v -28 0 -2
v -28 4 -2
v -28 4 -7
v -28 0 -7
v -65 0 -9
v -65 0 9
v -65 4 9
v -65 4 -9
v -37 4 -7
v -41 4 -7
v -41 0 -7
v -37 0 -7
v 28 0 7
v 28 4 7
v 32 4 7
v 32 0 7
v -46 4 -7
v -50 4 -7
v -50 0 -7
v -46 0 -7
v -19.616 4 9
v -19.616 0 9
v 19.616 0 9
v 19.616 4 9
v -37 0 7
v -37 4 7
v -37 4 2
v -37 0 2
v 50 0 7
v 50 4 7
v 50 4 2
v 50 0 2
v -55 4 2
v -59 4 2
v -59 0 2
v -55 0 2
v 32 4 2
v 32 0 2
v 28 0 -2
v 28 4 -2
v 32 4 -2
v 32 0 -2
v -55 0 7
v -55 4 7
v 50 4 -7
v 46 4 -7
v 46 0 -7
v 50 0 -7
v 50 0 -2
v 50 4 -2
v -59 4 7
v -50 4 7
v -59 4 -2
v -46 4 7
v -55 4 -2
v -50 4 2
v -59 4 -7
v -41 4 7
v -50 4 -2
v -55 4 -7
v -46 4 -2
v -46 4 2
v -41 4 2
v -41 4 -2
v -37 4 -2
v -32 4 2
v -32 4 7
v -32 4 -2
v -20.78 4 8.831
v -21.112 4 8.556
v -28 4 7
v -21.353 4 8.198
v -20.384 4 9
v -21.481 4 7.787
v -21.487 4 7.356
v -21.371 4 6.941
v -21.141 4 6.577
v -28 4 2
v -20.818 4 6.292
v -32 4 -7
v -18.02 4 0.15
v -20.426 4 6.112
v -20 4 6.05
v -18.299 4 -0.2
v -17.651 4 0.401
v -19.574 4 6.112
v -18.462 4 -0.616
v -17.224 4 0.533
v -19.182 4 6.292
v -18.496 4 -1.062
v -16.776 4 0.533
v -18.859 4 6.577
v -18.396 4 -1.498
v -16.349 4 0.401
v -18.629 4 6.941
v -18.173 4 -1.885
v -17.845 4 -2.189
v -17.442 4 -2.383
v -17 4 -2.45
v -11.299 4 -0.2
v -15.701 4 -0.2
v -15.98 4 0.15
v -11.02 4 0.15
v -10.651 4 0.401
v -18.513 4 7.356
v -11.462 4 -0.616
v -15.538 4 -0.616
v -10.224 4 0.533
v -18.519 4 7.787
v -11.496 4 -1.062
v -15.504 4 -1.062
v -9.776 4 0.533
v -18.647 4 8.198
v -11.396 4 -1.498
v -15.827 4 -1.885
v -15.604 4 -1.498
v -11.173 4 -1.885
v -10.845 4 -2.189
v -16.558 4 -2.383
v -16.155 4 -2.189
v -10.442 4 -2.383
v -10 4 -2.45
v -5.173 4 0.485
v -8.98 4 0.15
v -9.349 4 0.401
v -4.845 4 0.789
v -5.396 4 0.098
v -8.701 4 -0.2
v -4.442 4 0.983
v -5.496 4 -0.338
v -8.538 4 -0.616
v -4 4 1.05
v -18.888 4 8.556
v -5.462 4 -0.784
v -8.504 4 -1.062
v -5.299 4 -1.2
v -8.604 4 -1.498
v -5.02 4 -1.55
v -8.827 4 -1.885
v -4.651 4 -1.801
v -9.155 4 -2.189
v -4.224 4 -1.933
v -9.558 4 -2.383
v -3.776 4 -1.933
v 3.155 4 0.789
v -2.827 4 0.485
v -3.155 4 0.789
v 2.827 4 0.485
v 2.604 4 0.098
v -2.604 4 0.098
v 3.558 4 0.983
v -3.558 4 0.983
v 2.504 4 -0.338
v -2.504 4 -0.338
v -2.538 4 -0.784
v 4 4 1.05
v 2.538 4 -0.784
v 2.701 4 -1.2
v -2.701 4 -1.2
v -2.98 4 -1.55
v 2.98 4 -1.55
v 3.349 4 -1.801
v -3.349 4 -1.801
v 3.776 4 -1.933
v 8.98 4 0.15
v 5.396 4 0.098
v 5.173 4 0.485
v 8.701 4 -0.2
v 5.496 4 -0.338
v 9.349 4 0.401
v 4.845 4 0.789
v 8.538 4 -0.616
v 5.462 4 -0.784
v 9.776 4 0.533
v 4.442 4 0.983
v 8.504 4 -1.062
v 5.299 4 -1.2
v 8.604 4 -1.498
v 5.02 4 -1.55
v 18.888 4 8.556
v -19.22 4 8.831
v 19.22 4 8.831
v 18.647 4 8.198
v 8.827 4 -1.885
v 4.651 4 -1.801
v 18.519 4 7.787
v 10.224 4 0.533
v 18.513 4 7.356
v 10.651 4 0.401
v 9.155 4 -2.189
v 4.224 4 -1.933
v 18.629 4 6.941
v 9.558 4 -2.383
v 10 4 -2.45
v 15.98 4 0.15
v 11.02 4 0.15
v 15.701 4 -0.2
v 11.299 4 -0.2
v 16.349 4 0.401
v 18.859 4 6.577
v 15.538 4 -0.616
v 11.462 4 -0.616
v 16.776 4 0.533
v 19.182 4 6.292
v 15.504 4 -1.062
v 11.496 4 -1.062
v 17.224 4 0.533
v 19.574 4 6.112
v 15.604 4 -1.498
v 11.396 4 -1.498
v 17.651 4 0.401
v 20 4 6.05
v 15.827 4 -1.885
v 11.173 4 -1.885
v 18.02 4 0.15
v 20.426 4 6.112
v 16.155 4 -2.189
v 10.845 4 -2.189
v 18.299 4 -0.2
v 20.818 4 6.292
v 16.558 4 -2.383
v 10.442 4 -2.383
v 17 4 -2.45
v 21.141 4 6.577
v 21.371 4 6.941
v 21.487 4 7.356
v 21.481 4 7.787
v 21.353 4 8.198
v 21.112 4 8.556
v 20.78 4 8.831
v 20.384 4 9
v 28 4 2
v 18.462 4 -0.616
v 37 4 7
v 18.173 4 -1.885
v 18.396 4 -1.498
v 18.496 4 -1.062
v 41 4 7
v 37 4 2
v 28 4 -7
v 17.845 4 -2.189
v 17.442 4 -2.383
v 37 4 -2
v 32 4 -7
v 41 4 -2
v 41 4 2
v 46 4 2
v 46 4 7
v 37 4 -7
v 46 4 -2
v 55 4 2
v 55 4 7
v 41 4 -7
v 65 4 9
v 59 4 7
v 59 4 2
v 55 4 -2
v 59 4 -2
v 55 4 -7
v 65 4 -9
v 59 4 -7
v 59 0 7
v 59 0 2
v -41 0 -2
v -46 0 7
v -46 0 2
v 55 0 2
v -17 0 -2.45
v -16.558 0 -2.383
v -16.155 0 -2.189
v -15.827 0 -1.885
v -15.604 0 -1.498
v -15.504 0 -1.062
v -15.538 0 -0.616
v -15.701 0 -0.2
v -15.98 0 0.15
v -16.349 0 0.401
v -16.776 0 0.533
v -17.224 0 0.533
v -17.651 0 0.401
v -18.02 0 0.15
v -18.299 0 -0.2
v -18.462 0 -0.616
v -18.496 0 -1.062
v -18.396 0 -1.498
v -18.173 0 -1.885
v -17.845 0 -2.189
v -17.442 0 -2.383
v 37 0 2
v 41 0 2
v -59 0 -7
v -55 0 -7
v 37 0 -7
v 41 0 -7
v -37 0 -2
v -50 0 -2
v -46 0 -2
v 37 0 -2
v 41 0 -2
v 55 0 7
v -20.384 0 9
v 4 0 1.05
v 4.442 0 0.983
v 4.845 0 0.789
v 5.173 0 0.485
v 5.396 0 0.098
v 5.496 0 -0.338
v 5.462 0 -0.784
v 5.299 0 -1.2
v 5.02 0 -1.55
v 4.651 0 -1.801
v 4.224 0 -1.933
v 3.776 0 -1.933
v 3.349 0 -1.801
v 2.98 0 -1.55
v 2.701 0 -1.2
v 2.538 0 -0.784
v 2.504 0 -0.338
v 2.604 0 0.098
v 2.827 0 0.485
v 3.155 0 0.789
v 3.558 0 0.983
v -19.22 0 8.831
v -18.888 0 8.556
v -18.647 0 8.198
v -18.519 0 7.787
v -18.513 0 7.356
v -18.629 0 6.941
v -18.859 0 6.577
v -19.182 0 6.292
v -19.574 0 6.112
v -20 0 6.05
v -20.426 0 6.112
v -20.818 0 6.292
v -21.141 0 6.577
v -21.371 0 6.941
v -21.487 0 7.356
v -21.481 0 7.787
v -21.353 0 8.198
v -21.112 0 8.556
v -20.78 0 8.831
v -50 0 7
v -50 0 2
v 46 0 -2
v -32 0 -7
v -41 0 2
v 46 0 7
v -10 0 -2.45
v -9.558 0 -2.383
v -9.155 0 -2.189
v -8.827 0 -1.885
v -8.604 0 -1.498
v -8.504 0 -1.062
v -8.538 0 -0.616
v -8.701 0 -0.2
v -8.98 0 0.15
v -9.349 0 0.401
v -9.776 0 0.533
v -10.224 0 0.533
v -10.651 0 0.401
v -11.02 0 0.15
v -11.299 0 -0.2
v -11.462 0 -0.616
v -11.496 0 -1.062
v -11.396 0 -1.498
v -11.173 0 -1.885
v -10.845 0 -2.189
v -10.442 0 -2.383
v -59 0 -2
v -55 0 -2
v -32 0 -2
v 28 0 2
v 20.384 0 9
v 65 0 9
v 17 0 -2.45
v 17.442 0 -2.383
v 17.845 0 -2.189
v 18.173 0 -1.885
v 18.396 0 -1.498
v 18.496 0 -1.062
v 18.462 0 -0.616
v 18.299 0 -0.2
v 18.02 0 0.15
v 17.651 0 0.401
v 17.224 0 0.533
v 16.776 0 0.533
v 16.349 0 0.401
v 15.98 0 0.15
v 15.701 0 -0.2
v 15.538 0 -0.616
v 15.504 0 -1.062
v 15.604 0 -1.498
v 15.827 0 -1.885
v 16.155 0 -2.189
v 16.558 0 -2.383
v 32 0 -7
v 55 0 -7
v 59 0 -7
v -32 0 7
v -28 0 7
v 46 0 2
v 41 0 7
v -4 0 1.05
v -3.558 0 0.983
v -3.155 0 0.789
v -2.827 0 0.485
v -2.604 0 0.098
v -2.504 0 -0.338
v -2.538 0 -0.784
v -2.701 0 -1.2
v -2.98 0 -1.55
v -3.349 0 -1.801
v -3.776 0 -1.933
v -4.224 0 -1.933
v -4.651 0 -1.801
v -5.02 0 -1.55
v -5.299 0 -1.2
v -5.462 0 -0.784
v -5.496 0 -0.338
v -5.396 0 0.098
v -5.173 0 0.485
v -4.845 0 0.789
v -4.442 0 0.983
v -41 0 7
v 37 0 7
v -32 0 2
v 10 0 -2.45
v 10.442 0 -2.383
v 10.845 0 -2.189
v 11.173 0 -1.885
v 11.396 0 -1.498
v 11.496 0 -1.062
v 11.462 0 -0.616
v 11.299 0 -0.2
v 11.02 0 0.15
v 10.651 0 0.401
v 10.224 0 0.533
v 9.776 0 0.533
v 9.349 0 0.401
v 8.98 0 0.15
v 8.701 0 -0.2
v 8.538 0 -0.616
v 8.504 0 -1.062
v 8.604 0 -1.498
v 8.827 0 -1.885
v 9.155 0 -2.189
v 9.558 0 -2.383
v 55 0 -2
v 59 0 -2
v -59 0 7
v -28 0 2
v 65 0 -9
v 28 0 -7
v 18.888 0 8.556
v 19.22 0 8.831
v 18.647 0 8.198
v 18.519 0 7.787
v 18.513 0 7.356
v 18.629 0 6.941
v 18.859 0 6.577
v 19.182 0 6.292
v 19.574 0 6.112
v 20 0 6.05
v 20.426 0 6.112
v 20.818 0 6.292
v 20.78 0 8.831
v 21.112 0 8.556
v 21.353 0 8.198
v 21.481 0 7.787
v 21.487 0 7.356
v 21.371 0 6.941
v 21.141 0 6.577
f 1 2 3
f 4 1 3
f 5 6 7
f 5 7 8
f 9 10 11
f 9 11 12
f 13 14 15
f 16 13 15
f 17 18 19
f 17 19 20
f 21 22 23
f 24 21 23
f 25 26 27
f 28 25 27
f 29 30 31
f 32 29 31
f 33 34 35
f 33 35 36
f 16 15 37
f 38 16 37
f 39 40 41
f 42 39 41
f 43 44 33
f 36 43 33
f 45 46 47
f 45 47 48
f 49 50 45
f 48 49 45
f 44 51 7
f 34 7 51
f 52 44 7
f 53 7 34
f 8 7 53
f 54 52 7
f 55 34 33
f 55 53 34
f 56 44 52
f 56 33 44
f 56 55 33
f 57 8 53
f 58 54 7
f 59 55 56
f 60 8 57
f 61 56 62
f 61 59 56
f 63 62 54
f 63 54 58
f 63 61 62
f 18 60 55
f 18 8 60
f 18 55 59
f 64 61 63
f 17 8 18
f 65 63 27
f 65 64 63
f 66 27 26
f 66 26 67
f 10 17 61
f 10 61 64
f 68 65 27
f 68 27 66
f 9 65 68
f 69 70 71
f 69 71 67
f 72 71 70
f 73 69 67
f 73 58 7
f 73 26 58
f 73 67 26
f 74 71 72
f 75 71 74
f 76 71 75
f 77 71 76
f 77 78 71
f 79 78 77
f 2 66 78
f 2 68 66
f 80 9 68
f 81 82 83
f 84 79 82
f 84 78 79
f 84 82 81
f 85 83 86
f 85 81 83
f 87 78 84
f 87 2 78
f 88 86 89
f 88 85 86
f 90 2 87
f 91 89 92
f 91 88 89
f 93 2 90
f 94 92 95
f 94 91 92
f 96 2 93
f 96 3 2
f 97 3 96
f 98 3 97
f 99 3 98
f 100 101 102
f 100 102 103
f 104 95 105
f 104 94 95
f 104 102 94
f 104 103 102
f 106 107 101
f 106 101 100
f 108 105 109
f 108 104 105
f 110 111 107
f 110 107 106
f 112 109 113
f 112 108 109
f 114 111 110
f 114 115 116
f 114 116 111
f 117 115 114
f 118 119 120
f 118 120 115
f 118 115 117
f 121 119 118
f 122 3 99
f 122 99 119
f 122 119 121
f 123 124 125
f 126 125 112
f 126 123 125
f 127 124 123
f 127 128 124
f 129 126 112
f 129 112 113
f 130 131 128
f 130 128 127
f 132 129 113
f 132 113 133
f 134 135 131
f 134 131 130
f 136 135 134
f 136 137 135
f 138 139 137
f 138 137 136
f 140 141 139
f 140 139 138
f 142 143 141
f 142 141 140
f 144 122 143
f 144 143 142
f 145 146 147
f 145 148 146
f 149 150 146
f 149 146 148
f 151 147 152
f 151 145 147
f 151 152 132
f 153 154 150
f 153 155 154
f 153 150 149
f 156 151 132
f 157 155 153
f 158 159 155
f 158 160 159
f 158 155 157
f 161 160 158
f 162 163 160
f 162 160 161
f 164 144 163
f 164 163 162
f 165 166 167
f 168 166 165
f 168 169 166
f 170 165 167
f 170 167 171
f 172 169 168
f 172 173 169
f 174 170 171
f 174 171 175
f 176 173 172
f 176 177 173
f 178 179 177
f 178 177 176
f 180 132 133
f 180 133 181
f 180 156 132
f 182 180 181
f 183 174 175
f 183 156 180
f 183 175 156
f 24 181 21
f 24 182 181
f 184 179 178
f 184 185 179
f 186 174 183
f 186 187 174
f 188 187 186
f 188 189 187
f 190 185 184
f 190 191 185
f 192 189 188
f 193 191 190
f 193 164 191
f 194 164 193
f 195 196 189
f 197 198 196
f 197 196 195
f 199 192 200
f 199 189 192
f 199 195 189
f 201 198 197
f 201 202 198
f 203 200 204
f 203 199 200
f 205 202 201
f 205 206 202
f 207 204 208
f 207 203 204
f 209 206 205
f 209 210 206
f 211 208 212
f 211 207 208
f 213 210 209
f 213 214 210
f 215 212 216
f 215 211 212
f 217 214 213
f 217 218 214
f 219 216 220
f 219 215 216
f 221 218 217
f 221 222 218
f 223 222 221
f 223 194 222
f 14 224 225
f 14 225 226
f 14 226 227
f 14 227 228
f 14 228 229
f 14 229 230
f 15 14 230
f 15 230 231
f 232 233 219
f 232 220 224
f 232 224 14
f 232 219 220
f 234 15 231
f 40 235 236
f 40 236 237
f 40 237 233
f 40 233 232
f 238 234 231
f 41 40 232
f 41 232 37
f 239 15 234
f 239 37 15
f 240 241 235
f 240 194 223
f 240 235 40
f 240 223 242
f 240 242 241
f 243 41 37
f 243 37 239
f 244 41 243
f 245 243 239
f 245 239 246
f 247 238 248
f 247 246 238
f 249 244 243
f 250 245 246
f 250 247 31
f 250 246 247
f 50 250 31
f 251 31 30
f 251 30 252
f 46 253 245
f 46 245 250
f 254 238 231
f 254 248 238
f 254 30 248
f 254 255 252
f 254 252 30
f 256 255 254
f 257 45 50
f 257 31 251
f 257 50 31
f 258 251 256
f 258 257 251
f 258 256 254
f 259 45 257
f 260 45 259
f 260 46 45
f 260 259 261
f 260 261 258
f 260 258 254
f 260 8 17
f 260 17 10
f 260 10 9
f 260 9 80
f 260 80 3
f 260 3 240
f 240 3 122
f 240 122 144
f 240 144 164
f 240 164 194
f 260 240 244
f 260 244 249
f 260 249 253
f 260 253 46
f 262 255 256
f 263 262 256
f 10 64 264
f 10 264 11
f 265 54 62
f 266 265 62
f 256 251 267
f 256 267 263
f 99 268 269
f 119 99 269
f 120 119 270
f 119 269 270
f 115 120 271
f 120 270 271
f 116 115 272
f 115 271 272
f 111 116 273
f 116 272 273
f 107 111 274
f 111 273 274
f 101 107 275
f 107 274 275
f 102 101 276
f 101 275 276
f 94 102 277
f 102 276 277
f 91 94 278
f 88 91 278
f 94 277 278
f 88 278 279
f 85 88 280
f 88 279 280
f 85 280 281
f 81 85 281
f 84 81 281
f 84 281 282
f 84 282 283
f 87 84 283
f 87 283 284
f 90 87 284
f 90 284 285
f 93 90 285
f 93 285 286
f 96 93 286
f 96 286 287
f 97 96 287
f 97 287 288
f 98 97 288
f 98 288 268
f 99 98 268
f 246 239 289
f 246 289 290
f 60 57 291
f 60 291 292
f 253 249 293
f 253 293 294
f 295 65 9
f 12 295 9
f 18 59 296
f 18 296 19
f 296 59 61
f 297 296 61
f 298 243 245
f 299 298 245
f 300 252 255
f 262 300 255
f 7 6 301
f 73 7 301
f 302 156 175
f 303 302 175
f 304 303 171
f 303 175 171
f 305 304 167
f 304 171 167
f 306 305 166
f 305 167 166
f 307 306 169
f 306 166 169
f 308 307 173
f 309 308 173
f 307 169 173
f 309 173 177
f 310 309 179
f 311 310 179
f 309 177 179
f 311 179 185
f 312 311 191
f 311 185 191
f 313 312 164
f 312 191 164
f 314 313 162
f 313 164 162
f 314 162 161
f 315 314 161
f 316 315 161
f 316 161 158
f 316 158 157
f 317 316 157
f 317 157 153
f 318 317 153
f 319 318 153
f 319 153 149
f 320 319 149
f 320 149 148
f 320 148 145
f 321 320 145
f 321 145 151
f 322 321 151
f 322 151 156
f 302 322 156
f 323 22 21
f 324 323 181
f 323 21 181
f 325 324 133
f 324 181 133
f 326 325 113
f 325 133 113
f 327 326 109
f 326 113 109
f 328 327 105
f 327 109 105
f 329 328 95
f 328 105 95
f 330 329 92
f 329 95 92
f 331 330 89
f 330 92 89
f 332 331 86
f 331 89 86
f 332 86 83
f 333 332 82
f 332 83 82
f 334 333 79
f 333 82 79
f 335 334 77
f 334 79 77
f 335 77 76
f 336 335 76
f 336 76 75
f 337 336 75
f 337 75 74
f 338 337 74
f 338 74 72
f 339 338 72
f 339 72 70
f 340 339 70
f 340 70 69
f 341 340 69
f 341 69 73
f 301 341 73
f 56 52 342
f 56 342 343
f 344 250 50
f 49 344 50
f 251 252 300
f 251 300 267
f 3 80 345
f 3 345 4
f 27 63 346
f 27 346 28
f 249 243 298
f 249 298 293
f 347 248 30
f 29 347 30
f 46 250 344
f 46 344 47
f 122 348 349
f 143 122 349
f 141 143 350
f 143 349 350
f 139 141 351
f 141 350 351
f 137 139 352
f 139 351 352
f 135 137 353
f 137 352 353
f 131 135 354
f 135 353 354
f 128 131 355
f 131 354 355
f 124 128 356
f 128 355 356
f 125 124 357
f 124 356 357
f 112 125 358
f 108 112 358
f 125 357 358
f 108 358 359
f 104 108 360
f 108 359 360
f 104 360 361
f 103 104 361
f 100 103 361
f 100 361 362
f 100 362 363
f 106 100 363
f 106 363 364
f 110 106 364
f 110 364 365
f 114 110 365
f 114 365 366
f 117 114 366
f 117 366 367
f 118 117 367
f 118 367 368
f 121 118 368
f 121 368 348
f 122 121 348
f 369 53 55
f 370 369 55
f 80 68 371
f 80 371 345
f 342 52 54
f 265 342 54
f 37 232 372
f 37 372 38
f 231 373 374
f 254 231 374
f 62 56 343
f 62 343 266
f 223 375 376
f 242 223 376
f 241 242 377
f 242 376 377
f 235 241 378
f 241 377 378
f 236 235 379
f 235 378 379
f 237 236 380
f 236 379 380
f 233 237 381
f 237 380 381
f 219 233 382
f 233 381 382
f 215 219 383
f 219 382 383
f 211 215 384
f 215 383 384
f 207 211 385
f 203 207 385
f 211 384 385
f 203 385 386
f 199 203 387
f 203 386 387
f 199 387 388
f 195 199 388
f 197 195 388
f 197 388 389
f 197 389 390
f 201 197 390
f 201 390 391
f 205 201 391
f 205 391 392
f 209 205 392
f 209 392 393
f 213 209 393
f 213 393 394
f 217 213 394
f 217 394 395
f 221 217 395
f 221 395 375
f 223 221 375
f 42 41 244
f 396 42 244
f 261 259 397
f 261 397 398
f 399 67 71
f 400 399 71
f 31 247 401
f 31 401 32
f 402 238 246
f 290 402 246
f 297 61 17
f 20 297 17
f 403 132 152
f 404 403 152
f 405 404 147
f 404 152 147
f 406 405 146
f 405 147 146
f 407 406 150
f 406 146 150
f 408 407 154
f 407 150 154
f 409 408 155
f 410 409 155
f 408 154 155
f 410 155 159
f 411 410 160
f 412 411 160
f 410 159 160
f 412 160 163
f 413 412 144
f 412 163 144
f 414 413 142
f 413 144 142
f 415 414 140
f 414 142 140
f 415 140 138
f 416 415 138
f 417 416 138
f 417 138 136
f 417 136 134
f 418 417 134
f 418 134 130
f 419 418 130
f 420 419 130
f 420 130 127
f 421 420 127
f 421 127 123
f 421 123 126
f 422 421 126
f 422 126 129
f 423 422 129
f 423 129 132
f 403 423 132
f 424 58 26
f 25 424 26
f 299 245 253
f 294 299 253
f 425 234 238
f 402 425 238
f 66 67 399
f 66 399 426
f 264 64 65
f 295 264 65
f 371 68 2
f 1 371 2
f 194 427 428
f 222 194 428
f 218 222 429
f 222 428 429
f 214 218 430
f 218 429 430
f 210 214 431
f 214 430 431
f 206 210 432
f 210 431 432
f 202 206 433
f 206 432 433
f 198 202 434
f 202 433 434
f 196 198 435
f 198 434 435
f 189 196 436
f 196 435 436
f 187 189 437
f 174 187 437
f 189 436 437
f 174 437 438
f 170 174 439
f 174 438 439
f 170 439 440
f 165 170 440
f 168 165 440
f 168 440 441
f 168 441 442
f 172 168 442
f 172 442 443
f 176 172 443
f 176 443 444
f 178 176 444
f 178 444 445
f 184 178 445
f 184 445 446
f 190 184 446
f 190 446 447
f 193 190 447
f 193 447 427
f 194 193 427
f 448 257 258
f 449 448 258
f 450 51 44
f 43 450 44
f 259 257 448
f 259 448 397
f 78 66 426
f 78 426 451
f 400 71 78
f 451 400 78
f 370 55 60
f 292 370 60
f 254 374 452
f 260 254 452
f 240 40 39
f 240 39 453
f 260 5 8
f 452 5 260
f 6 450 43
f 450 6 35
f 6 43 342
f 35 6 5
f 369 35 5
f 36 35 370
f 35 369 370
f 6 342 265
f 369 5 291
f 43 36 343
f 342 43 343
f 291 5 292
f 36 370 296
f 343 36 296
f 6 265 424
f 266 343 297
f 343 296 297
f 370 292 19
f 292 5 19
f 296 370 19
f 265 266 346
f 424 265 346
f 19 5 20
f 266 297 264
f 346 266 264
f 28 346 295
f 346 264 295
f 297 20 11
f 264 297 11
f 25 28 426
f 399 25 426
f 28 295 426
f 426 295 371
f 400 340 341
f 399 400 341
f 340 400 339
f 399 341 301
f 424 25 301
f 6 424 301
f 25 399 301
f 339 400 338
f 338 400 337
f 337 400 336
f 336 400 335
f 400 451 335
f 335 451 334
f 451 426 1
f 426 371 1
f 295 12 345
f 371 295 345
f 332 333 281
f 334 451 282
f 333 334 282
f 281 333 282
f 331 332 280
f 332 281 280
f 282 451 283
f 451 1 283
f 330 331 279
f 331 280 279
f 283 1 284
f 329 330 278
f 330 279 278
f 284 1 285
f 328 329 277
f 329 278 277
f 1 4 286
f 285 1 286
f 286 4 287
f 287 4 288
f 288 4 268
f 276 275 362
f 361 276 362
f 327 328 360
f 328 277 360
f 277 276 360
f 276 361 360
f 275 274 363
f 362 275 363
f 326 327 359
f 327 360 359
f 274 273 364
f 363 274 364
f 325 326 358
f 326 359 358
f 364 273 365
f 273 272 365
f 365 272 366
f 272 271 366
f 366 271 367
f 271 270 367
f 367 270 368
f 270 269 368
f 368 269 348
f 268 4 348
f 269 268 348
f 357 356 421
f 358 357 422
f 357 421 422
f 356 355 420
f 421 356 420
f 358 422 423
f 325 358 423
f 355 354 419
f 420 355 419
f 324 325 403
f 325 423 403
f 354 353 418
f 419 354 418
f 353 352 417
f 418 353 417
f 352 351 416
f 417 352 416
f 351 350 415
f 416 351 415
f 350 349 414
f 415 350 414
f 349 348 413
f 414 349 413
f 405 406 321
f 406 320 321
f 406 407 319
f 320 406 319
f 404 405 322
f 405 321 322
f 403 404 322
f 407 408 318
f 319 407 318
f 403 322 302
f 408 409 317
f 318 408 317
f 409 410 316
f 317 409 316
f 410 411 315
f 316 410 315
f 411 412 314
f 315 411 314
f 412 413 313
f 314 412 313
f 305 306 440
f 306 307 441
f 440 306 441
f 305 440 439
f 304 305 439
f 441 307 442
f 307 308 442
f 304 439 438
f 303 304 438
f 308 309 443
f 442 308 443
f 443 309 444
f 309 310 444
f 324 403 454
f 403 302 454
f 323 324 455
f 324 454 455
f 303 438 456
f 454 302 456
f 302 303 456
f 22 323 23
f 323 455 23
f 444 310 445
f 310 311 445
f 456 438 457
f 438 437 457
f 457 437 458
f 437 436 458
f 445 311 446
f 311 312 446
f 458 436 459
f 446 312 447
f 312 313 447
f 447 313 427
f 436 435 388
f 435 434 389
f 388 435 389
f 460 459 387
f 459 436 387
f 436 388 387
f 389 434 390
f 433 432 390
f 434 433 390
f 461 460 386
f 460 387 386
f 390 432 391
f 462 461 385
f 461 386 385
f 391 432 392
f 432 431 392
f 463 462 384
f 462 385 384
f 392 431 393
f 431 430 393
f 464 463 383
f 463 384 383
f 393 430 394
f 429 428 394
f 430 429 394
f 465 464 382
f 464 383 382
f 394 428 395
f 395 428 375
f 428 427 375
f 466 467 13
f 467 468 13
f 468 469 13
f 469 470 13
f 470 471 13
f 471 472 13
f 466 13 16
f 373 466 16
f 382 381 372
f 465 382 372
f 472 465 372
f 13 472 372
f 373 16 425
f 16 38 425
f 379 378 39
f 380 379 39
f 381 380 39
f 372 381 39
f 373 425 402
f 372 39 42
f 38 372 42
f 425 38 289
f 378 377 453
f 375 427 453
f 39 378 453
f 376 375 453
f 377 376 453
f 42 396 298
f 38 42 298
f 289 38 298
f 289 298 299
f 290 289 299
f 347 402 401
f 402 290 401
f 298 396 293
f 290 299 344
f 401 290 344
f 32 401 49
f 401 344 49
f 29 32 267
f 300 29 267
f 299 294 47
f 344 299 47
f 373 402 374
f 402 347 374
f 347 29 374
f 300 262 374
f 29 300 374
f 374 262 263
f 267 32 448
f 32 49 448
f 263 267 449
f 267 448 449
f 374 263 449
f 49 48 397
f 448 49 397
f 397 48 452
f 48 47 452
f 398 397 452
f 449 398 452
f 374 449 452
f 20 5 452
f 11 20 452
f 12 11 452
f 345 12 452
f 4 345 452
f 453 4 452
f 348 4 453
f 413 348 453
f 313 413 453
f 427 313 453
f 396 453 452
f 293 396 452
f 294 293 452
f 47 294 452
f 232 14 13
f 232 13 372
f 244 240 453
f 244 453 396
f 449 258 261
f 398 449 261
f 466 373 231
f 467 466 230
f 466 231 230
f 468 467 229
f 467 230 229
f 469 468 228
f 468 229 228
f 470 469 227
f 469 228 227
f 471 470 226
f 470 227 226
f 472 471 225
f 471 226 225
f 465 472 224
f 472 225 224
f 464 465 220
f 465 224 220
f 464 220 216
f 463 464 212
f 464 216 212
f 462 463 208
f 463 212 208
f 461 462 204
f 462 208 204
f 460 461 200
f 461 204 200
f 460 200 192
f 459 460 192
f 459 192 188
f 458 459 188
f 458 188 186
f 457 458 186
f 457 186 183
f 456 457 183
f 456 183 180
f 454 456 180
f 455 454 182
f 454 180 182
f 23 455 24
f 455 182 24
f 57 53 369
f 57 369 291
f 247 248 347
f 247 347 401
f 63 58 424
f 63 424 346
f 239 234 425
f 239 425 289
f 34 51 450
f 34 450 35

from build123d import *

# Parameters (mm, degrees)
SKETCH1_W           = 130
SKETCH1_H           = 18
BOSS_EXTRUDE1_DEPTH = 4
SKETCH2_W           = 4
SKETCH2_H           = 5
CUT_EXTRUDE1_DEPTH  = 66.741919656
SKETCH3_R           = 1.5
CUT_EXTRUDE2_DEPTH  = 66.741919656
SKETCH4_R           = 1.5
CUT_EXTRUDE3_DEPTH  = 66.741919656


with BuildPart() as part:
    # Sketch1 → Boss-Extrude1 (new body)
    with BuildSketch(Plane(origin=(0, 0, 0), x_dir=(1, 0, 0), z_dir=(0, 1, 0))):
        Rectangle(SKETCH1_W, SKETCH1_H)
    extrude(amount=BOSS_EXTRUDE1_DEPTH)

    # Sketch2 → Cut-Extrude1 (cut, through all)
    with BuildSketch(Plane(origin=(0, 4, 0), x_dir=(1, 0, 0), z_dir=(0, 1, 0))):
        with Locations((57, -4.5)):
            Rectangle(SKETCH2_W, SKETCH2_H)
        with Locations((57, 4.5)):
            Rectangle(SKETCH2_W, SKETCH2_H)
        with Locations((-57, -4.5)):
            Rectangle(SKETCH2_W, SKETCH2_H)
        with Locations((-57, 4.5)):
            Rectangle(SKETCH2_W, SKETCH2_H)
        with Locations((48, -4.5)):
            Rectangle(SKETCH2_W, SKETCH2_H)
        with Locations((48, 4.5)):
            Rectangle(SKETCH2_W, SKETCH2_H)
        with Locations((39, -4.5)):
            Rectangle(SKETCH2_W, SKETCH2_H)
        with Locations((39, 4.5)):
            Rectangle(SKETCH2_W, SKETCH2_H)
        with Locations((30, -4.5)):
            Rectangle(SKETCH2_W, SKETCH2_H)
        with Locations((30, 4.5)):
            Rectangle(SKETCH2_W, SKETCH2_H)
        with Locations((-48, 4.5)):
            Rectangle(SKETCH2_W, SKETCH2_H)
        with Locations((-30, 4.5)):
            Rectangle(SKETCH2_W, SKETCH2_H)
        with Locations((-30, -4.5)):
            Rectangle(SKETCH2_W, SKETCH2_H)
        with Locations((-39, 4.5)):
            Rectangle(SKETCH2_W, SKETCH2_H)
        with Locations((-39, -4.5)):
            Rectangle(SKETCH2_W, SKETCH2_H)
        with Locations((-48, -4.5)):
            Rectangle(SKETCH2_W, SKETCH2_H)
    extrude(amount=-CUT_EXTRUDE1_DEPTH, mode=Mode.SUBTRACT)

    # Sketch3 → Cut-Extrude2 (cut, through all)
    with BuildSketch(Plane.XZ):
        with Locations(Location((17, -0.95, 0), (0, 0, 270))):
            Circle(SKETCH3_R)
        with Locations(Location((-10, -0.95, 0), (0, 0, 270))):
            Circle(SKETCH3_R)
        with Locations(Location((-17, -0.95, 0), (0, 0, 270))):
            Circle(SKETCH3_R)
        with Locations(Location((10, -0.95, 0), (0, 0, 270))):
            Circle(SKETCH3_R)
    extrude(amount=-CUT_EXTRUDE2_DEPTH, mode=Mode.SUBTRACT)

    # Sketch4 → Cut-Extrude3 (cut, through all)
    with BuildSketch(Plane(origin=(0, 4, 0), x_dir=(1, 0, 0), z_dir=(0, 1, 0))):
        with Locations(Location((4, 0.45, 0), (0, 0, 270))):
            Circle(SKETCH4_R)
        with Locations(Location((-4, 0.45, 0), (0, 0, 270))):
            Circle(SKETCH4_R)
        with Locations((-20, -7.55)):
            Circle(SKETCH4_R)
        with Locations((20, -7.55)):
            Circle(SKETCH4_R)
    extrude(amount=-CUT_EXTRUDE3_DEPTH, mode=Mode.SUBTRACT)


solid = part.part
